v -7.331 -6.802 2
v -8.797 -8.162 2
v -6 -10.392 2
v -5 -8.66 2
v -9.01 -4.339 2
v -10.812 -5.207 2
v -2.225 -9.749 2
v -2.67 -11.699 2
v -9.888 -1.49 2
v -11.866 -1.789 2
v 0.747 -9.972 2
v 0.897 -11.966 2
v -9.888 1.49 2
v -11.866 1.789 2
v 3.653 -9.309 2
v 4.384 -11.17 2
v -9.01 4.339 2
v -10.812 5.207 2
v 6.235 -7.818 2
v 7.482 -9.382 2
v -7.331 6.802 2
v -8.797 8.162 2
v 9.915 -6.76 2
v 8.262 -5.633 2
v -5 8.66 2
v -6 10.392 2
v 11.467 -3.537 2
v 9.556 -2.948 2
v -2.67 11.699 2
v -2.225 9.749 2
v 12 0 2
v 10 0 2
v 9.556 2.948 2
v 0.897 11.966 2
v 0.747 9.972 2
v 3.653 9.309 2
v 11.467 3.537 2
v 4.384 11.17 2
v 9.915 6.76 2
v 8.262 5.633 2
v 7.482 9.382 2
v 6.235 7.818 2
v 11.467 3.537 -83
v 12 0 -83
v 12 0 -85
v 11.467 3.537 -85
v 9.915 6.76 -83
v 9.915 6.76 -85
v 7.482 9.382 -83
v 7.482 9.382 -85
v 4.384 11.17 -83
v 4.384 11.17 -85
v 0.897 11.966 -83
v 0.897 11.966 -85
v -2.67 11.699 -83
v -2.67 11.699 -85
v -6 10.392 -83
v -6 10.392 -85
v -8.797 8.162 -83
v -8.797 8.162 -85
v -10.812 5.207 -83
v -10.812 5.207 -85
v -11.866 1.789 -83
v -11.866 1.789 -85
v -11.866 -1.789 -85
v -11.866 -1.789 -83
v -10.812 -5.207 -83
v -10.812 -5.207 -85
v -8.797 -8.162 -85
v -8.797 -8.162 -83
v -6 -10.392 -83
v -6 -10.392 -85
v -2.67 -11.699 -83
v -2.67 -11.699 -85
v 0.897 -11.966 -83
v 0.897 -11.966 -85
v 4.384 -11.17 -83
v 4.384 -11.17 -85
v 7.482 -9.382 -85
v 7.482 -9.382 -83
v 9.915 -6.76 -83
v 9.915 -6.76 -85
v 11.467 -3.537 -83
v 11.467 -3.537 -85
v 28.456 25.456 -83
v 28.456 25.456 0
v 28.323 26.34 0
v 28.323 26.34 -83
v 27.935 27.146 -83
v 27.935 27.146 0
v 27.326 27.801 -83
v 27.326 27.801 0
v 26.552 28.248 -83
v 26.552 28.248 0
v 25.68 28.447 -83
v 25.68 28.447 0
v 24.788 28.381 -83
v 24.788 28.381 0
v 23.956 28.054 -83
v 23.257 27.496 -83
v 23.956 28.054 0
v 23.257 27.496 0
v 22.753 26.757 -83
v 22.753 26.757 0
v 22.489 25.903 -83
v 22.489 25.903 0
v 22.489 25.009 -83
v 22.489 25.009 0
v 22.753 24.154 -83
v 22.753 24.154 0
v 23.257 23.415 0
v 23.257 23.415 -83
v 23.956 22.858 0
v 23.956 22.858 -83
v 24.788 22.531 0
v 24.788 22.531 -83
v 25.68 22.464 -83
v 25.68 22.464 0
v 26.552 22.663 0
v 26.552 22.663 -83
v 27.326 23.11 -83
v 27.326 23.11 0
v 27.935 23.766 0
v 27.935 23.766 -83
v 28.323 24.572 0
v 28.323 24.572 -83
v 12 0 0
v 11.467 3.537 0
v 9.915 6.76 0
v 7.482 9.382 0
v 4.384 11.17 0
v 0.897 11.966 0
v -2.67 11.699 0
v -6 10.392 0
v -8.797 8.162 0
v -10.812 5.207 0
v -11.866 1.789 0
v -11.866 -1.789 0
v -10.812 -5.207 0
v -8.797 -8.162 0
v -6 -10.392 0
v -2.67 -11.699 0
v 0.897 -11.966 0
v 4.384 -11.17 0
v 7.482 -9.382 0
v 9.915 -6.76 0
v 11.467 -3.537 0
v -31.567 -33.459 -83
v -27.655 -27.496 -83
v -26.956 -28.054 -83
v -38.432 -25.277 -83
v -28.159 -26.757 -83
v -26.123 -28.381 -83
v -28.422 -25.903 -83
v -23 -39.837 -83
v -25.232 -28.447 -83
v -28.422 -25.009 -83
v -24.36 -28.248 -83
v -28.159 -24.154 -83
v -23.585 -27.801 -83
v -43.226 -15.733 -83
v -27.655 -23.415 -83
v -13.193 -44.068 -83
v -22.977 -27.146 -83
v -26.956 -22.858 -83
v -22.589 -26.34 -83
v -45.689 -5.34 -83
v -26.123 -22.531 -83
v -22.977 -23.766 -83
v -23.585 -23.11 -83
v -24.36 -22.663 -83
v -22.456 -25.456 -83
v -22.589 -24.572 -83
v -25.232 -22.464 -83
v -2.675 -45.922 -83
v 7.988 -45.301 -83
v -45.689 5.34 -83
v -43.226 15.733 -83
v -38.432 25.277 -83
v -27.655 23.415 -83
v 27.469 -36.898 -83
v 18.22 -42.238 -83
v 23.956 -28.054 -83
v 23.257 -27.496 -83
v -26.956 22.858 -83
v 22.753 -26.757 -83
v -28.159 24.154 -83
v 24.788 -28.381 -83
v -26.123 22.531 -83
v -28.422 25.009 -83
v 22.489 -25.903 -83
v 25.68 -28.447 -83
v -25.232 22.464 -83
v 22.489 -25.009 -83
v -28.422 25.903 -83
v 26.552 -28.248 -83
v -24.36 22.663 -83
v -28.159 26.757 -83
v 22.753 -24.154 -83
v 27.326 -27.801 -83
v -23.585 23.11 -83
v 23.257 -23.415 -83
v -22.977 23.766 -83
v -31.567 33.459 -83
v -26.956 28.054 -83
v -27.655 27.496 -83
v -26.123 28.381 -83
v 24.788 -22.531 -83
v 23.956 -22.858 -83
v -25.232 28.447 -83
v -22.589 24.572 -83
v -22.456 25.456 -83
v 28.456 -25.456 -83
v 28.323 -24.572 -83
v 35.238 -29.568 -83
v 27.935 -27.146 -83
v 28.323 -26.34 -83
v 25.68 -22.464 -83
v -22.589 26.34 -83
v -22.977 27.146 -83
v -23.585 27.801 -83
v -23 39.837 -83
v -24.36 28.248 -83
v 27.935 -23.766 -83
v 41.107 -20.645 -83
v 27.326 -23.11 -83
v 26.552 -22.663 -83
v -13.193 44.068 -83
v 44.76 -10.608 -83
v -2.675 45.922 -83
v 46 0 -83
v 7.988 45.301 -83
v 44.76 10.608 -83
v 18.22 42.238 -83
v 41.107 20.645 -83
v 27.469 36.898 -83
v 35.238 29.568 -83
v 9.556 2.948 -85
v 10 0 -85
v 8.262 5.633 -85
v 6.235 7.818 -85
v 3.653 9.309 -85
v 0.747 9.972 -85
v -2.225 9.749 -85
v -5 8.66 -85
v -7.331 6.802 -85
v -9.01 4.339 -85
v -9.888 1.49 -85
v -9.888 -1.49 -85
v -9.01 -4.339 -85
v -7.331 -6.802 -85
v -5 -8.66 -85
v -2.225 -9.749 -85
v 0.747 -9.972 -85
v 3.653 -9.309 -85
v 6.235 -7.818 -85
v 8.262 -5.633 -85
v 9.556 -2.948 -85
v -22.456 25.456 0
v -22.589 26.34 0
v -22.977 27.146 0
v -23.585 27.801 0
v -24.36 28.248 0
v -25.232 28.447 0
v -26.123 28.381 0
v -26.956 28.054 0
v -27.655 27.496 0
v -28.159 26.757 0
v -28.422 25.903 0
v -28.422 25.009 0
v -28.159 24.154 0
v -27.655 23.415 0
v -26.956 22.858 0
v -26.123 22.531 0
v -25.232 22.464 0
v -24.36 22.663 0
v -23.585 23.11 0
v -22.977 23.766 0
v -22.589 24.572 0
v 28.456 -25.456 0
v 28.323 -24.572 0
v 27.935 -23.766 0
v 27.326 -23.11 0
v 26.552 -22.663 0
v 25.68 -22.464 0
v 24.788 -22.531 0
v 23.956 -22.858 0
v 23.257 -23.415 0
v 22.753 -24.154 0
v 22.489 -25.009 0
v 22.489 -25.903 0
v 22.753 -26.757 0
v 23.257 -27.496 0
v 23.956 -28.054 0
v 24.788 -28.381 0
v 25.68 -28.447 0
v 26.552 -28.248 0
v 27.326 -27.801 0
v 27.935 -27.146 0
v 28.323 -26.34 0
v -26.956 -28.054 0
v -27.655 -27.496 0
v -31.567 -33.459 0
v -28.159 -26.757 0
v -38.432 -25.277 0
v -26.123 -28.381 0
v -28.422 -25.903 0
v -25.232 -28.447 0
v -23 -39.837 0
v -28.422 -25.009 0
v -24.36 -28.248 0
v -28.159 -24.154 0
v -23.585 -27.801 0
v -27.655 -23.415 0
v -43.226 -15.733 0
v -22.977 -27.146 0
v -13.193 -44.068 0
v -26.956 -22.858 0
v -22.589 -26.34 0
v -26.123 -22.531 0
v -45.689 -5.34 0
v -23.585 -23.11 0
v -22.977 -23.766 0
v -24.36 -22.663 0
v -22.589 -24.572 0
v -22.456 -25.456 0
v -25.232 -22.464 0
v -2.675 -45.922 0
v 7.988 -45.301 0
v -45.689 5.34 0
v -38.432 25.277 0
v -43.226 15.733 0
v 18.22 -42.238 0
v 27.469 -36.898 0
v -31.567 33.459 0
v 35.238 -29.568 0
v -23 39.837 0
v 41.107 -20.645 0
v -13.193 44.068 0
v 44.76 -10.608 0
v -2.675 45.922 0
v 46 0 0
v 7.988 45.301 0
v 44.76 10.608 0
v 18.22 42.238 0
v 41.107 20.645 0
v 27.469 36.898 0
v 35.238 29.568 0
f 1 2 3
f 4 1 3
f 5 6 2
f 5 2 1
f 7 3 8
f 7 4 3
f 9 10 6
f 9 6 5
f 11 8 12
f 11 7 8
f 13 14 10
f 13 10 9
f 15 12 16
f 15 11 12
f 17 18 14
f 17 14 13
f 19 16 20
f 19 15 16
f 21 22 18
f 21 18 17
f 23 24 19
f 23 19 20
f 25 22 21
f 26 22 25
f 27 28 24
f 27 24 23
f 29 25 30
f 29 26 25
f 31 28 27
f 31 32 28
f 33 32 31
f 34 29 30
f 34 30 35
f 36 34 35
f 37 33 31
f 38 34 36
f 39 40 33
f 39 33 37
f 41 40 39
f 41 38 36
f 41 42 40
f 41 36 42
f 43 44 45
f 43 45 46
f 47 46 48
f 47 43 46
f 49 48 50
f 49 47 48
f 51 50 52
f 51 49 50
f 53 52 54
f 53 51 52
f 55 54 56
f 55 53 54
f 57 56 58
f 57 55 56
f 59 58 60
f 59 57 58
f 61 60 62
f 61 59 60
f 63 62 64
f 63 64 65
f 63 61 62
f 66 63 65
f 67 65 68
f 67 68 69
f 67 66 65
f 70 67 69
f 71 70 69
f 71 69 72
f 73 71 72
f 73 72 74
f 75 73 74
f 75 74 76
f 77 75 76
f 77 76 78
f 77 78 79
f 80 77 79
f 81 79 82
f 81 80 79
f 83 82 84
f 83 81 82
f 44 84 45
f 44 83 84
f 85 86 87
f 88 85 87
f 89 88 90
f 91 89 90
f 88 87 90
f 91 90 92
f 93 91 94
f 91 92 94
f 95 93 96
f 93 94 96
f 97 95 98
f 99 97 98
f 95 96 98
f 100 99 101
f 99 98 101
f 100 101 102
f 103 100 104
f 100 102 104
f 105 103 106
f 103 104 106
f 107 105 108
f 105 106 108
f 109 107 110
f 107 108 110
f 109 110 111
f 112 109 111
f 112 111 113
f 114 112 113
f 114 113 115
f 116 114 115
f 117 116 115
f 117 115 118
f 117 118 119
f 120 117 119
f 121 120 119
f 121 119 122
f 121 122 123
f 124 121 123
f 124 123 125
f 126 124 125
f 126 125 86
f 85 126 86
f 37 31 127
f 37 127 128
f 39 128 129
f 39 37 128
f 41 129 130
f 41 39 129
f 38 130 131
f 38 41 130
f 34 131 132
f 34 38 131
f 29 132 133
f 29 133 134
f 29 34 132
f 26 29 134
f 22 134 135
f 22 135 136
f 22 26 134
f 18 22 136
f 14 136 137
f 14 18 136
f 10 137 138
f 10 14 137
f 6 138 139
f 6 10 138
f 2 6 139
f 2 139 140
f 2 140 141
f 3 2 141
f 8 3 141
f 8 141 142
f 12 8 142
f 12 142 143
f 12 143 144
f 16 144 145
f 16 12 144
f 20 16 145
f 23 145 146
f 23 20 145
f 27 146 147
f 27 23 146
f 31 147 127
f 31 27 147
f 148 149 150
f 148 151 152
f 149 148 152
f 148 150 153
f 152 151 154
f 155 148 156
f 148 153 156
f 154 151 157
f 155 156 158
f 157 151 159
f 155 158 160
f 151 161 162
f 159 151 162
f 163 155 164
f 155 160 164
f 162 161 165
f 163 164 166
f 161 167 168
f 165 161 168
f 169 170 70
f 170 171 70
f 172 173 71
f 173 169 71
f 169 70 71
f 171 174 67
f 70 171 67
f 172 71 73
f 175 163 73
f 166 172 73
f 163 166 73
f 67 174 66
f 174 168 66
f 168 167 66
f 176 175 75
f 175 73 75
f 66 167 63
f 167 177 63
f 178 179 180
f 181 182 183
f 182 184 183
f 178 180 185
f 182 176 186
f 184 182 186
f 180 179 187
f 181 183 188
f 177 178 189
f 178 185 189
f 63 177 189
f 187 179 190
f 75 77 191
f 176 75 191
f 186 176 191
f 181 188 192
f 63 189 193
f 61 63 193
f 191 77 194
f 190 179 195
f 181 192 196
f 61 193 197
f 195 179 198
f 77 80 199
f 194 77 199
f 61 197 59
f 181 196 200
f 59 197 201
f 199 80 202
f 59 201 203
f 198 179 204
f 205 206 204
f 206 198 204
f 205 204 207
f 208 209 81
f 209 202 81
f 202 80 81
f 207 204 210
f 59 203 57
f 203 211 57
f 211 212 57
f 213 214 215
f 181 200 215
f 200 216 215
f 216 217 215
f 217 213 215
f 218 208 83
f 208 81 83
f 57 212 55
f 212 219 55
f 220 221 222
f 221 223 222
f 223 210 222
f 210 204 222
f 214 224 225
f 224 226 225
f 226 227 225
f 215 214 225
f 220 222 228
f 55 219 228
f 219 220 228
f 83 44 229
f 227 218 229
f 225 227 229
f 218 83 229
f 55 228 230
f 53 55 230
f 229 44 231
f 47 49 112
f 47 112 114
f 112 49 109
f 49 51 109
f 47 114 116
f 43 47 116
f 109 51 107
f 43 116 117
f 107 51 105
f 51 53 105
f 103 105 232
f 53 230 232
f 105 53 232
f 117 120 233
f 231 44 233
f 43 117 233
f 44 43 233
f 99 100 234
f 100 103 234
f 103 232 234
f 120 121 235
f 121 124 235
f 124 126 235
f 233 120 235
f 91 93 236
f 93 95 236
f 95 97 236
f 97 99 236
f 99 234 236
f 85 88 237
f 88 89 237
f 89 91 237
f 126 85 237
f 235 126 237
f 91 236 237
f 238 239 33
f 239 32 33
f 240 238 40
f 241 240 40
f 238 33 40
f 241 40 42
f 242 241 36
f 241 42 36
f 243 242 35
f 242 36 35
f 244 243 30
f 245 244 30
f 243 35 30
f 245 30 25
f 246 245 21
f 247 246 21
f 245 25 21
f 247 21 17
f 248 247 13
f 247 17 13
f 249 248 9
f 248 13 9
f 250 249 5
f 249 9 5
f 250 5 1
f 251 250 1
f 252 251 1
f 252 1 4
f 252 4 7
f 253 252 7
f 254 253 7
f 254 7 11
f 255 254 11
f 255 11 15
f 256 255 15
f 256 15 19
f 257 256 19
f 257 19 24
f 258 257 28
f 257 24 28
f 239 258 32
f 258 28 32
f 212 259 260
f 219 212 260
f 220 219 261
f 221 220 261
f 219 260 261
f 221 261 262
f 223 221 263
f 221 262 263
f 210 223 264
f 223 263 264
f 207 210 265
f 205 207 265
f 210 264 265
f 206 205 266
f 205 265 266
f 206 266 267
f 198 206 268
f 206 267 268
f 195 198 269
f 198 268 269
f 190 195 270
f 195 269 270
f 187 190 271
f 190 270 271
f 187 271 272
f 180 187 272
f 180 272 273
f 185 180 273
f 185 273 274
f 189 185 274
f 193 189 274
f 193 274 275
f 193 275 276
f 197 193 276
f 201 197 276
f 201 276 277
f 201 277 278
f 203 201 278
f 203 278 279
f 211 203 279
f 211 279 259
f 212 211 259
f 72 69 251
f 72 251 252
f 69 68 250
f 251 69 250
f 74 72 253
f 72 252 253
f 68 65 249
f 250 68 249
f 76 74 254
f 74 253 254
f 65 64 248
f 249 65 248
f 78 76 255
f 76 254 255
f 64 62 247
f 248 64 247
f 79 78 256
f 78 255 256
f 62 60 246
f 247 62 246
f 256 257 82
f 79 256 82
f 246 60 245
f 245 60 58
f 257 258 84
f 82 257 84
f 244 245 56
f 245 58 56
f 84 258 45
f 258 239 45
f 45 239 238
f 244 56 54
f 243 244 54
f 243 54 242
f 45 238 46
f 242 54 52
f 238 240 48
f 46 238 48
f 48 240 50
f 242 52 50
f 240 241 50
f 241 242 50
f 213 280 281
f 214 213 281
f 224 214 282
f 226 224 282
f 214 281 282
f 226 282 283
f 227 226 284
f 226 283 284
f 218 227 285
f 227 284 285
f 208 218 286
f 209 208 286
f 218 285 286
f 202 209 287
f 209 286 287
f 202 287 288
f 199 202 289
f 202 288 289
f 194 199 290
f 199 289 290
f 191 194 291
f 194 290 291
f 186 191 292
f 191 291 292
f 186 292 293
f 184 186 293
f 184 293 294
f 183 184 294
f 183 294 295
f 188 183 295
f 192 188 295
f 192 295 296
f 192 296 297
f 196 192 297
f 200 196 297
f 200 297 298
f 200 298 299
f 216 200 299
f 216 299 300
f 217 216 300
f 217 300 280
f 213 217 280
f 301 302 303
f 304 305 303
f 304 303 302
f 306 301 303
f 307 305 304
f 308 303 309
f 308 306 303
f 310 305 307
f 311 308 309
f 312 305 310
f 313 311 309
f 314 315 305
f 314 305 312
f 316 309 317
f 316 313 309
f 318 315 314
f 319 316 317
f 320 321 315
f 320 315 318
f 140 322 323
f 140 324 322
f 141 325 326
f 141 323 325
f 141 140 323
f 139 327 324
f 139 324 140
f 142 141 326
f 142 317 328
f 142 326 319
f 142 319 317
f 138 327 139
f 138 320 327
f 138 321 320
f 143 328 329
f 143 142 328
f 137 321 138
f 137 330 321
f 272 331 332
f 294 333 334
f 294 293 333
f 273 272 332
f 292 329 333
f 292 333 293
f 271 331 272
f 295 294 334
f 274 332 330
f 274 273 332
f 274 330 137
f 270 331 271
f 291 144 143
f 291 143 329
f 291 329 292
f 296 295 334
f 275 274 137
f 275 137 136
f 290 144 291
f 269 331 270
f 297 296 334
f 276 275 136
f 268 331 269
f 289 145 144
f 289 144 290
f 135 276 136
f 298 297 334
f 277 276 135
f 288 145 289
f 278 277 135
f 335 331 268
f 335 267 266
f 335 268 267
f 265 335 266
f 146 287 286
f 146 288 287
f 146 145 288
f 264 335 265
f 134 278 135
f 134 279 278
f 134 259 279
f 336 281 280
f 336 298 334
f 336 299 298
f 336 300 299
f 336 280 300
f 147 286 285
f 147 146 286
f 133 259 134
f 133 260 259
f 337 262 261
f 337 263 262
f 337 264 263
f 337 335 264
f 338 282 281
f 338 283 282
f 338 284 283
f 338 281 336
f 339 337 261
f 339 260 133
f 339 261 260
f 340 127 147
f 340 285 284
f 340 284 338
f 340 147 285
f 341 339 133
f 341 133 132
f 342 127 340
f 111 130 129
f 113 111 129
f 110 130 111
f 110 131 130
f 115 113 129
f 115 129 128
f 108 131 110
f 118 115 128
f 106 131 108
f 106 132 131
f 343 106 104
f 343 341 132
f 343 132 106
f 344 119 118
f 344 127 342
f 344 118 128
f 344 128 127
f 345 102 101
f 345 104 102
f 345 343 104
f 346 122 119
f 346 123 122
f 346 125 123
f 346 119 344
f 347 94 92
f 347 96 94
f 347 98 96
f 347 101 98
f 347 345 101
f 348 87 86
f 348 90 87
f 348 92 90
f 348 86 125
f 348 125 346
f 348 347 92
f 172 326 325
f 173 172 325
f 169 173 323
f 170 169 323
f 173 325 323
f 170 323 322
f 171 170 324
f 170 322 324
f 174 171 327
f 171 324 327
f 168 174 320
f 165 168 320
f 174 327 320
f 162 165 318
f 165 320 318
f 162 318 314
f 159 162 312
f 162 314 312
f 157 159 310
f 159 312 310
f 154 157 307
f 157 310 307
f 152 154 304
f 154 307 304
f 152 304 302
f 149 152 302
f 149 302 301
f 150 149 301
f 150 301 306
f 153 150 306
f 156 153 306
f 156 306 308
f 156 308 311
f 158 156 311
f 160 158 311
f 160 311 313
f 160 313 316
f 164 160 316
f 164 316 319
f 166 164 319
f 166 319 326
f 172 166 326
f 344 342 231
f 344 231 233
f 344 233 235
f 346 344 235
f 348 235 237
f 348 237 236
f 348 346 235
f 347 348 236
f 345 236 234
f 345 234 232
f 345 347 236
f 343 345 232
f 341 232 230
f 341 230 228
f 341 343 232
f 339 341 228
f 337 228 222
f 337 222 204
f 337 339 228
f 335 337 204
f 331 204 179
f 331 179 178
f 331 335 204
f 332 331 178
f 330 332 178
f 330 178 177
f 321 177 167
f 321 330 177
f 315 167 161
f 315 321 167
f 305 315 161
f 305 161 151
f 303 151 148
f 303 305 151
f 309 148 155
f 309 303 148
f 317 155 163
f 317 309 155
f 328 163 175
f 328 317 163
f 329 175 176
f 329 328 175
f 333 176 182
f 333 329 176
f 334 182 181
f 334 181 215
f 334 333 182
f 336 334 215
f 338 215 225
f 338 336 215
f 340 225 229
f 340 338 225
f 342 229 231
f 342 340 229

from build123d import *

# Parameters (mm, degrees)
IZIM1_R                     = 46
IZIM1_R_2                   = 12
IZIM1_R_3                   = 10
Y_KSEKLIK_EKSTR_ZYON2_DEPTH = 83
Y_KSEKLIK_EKSTR_ZYON3_START = 2
IZIM1_4_R                   = 12
IZIM1_4_R_2                 = 10
Y_KSEKLIK_EKSTR_ZYON3_DEPTH = 2
Y_KSEKLIK_EKSTR_ZYON4_START = -83
IZIM1_7_R                   = 12
IZIM1_7_R_2                 = 10
Y_KSEKLIK_EKSTR_ZYON4_DEPTH = 2
IZIM2_R                     = 3
KES_EKSTR_ZYON1_DEPTH       = 100


with BuildPart() as part:
    # Çizim1 → Yükseklik-Ekstrüzyon2 (new body)
    # profile 1 of 2: a face of its own
    with BuildSketch(Plane.XY):
        Circle(IZIM1_R)
        Circle(IZIM1_R_2, mode=Mode.SUBTRACT)
    # profile 2 of 2: a face of its own
    with BuildSketch(Plane.XY):
        Circle(IZIM1_R_2)
        Circle(IZIM1_R_3, mode=Mode.SUBTRACT)
    extrude(amount=-Y_KSEKLIK_EKSTR_ZYON2_DEPTH)

    # Çizim1<4> → Yükseklik-Ekstrüzyon3 (add)
    with BuildSketch(Plane.XY.offset(Y_KSEKLIK_EKSTR_ZYON3_START)):
        Circle(IZIM1_4_R)
        Circle(IZIM1_4_R_2, mode=Mode.SUBTRACT)
    extrude(amount=-Y_KSEKLIK_EKSTR_ZYON3_DEPTH)

    # Çizim1<7> → Yükseklik-Ekstrüzyon4 (add)
    with BuildSketch(Plane.XY.offset(Y_KSEKLIK_EKSTR_ZYON4_START)):
        Circle(IZIM1_7_R)
        Circle(IZIM1_7_R_2, mode=Mode.SUBTRACT)
    extrude(amount=-Y_KSEKLIK_EKSTR_ZYON4_DEPTH)

    # Çizim2 → Kes-Ekstrüzyon1 (cut)
    with BuildSketch(Plane.XY):
        with Locations((-25.455844123, 25.455844123)):
            Circle(IZIM2_R)
        with Locations((25.455844123, 25.455844123)):
            Circle(IZIM2_R)
        with Locations((25.455844123, -25.455844123)):
            Circle(IZIM2_R)
        with Locations((-25.455844123, -25.455844123)):
            Circle(IZIM2_R)
    extrude(amount=-KES_EKSTR_ZYON1_DEPTH, mode=Mode.SUBTRACT)


solid = part.part
